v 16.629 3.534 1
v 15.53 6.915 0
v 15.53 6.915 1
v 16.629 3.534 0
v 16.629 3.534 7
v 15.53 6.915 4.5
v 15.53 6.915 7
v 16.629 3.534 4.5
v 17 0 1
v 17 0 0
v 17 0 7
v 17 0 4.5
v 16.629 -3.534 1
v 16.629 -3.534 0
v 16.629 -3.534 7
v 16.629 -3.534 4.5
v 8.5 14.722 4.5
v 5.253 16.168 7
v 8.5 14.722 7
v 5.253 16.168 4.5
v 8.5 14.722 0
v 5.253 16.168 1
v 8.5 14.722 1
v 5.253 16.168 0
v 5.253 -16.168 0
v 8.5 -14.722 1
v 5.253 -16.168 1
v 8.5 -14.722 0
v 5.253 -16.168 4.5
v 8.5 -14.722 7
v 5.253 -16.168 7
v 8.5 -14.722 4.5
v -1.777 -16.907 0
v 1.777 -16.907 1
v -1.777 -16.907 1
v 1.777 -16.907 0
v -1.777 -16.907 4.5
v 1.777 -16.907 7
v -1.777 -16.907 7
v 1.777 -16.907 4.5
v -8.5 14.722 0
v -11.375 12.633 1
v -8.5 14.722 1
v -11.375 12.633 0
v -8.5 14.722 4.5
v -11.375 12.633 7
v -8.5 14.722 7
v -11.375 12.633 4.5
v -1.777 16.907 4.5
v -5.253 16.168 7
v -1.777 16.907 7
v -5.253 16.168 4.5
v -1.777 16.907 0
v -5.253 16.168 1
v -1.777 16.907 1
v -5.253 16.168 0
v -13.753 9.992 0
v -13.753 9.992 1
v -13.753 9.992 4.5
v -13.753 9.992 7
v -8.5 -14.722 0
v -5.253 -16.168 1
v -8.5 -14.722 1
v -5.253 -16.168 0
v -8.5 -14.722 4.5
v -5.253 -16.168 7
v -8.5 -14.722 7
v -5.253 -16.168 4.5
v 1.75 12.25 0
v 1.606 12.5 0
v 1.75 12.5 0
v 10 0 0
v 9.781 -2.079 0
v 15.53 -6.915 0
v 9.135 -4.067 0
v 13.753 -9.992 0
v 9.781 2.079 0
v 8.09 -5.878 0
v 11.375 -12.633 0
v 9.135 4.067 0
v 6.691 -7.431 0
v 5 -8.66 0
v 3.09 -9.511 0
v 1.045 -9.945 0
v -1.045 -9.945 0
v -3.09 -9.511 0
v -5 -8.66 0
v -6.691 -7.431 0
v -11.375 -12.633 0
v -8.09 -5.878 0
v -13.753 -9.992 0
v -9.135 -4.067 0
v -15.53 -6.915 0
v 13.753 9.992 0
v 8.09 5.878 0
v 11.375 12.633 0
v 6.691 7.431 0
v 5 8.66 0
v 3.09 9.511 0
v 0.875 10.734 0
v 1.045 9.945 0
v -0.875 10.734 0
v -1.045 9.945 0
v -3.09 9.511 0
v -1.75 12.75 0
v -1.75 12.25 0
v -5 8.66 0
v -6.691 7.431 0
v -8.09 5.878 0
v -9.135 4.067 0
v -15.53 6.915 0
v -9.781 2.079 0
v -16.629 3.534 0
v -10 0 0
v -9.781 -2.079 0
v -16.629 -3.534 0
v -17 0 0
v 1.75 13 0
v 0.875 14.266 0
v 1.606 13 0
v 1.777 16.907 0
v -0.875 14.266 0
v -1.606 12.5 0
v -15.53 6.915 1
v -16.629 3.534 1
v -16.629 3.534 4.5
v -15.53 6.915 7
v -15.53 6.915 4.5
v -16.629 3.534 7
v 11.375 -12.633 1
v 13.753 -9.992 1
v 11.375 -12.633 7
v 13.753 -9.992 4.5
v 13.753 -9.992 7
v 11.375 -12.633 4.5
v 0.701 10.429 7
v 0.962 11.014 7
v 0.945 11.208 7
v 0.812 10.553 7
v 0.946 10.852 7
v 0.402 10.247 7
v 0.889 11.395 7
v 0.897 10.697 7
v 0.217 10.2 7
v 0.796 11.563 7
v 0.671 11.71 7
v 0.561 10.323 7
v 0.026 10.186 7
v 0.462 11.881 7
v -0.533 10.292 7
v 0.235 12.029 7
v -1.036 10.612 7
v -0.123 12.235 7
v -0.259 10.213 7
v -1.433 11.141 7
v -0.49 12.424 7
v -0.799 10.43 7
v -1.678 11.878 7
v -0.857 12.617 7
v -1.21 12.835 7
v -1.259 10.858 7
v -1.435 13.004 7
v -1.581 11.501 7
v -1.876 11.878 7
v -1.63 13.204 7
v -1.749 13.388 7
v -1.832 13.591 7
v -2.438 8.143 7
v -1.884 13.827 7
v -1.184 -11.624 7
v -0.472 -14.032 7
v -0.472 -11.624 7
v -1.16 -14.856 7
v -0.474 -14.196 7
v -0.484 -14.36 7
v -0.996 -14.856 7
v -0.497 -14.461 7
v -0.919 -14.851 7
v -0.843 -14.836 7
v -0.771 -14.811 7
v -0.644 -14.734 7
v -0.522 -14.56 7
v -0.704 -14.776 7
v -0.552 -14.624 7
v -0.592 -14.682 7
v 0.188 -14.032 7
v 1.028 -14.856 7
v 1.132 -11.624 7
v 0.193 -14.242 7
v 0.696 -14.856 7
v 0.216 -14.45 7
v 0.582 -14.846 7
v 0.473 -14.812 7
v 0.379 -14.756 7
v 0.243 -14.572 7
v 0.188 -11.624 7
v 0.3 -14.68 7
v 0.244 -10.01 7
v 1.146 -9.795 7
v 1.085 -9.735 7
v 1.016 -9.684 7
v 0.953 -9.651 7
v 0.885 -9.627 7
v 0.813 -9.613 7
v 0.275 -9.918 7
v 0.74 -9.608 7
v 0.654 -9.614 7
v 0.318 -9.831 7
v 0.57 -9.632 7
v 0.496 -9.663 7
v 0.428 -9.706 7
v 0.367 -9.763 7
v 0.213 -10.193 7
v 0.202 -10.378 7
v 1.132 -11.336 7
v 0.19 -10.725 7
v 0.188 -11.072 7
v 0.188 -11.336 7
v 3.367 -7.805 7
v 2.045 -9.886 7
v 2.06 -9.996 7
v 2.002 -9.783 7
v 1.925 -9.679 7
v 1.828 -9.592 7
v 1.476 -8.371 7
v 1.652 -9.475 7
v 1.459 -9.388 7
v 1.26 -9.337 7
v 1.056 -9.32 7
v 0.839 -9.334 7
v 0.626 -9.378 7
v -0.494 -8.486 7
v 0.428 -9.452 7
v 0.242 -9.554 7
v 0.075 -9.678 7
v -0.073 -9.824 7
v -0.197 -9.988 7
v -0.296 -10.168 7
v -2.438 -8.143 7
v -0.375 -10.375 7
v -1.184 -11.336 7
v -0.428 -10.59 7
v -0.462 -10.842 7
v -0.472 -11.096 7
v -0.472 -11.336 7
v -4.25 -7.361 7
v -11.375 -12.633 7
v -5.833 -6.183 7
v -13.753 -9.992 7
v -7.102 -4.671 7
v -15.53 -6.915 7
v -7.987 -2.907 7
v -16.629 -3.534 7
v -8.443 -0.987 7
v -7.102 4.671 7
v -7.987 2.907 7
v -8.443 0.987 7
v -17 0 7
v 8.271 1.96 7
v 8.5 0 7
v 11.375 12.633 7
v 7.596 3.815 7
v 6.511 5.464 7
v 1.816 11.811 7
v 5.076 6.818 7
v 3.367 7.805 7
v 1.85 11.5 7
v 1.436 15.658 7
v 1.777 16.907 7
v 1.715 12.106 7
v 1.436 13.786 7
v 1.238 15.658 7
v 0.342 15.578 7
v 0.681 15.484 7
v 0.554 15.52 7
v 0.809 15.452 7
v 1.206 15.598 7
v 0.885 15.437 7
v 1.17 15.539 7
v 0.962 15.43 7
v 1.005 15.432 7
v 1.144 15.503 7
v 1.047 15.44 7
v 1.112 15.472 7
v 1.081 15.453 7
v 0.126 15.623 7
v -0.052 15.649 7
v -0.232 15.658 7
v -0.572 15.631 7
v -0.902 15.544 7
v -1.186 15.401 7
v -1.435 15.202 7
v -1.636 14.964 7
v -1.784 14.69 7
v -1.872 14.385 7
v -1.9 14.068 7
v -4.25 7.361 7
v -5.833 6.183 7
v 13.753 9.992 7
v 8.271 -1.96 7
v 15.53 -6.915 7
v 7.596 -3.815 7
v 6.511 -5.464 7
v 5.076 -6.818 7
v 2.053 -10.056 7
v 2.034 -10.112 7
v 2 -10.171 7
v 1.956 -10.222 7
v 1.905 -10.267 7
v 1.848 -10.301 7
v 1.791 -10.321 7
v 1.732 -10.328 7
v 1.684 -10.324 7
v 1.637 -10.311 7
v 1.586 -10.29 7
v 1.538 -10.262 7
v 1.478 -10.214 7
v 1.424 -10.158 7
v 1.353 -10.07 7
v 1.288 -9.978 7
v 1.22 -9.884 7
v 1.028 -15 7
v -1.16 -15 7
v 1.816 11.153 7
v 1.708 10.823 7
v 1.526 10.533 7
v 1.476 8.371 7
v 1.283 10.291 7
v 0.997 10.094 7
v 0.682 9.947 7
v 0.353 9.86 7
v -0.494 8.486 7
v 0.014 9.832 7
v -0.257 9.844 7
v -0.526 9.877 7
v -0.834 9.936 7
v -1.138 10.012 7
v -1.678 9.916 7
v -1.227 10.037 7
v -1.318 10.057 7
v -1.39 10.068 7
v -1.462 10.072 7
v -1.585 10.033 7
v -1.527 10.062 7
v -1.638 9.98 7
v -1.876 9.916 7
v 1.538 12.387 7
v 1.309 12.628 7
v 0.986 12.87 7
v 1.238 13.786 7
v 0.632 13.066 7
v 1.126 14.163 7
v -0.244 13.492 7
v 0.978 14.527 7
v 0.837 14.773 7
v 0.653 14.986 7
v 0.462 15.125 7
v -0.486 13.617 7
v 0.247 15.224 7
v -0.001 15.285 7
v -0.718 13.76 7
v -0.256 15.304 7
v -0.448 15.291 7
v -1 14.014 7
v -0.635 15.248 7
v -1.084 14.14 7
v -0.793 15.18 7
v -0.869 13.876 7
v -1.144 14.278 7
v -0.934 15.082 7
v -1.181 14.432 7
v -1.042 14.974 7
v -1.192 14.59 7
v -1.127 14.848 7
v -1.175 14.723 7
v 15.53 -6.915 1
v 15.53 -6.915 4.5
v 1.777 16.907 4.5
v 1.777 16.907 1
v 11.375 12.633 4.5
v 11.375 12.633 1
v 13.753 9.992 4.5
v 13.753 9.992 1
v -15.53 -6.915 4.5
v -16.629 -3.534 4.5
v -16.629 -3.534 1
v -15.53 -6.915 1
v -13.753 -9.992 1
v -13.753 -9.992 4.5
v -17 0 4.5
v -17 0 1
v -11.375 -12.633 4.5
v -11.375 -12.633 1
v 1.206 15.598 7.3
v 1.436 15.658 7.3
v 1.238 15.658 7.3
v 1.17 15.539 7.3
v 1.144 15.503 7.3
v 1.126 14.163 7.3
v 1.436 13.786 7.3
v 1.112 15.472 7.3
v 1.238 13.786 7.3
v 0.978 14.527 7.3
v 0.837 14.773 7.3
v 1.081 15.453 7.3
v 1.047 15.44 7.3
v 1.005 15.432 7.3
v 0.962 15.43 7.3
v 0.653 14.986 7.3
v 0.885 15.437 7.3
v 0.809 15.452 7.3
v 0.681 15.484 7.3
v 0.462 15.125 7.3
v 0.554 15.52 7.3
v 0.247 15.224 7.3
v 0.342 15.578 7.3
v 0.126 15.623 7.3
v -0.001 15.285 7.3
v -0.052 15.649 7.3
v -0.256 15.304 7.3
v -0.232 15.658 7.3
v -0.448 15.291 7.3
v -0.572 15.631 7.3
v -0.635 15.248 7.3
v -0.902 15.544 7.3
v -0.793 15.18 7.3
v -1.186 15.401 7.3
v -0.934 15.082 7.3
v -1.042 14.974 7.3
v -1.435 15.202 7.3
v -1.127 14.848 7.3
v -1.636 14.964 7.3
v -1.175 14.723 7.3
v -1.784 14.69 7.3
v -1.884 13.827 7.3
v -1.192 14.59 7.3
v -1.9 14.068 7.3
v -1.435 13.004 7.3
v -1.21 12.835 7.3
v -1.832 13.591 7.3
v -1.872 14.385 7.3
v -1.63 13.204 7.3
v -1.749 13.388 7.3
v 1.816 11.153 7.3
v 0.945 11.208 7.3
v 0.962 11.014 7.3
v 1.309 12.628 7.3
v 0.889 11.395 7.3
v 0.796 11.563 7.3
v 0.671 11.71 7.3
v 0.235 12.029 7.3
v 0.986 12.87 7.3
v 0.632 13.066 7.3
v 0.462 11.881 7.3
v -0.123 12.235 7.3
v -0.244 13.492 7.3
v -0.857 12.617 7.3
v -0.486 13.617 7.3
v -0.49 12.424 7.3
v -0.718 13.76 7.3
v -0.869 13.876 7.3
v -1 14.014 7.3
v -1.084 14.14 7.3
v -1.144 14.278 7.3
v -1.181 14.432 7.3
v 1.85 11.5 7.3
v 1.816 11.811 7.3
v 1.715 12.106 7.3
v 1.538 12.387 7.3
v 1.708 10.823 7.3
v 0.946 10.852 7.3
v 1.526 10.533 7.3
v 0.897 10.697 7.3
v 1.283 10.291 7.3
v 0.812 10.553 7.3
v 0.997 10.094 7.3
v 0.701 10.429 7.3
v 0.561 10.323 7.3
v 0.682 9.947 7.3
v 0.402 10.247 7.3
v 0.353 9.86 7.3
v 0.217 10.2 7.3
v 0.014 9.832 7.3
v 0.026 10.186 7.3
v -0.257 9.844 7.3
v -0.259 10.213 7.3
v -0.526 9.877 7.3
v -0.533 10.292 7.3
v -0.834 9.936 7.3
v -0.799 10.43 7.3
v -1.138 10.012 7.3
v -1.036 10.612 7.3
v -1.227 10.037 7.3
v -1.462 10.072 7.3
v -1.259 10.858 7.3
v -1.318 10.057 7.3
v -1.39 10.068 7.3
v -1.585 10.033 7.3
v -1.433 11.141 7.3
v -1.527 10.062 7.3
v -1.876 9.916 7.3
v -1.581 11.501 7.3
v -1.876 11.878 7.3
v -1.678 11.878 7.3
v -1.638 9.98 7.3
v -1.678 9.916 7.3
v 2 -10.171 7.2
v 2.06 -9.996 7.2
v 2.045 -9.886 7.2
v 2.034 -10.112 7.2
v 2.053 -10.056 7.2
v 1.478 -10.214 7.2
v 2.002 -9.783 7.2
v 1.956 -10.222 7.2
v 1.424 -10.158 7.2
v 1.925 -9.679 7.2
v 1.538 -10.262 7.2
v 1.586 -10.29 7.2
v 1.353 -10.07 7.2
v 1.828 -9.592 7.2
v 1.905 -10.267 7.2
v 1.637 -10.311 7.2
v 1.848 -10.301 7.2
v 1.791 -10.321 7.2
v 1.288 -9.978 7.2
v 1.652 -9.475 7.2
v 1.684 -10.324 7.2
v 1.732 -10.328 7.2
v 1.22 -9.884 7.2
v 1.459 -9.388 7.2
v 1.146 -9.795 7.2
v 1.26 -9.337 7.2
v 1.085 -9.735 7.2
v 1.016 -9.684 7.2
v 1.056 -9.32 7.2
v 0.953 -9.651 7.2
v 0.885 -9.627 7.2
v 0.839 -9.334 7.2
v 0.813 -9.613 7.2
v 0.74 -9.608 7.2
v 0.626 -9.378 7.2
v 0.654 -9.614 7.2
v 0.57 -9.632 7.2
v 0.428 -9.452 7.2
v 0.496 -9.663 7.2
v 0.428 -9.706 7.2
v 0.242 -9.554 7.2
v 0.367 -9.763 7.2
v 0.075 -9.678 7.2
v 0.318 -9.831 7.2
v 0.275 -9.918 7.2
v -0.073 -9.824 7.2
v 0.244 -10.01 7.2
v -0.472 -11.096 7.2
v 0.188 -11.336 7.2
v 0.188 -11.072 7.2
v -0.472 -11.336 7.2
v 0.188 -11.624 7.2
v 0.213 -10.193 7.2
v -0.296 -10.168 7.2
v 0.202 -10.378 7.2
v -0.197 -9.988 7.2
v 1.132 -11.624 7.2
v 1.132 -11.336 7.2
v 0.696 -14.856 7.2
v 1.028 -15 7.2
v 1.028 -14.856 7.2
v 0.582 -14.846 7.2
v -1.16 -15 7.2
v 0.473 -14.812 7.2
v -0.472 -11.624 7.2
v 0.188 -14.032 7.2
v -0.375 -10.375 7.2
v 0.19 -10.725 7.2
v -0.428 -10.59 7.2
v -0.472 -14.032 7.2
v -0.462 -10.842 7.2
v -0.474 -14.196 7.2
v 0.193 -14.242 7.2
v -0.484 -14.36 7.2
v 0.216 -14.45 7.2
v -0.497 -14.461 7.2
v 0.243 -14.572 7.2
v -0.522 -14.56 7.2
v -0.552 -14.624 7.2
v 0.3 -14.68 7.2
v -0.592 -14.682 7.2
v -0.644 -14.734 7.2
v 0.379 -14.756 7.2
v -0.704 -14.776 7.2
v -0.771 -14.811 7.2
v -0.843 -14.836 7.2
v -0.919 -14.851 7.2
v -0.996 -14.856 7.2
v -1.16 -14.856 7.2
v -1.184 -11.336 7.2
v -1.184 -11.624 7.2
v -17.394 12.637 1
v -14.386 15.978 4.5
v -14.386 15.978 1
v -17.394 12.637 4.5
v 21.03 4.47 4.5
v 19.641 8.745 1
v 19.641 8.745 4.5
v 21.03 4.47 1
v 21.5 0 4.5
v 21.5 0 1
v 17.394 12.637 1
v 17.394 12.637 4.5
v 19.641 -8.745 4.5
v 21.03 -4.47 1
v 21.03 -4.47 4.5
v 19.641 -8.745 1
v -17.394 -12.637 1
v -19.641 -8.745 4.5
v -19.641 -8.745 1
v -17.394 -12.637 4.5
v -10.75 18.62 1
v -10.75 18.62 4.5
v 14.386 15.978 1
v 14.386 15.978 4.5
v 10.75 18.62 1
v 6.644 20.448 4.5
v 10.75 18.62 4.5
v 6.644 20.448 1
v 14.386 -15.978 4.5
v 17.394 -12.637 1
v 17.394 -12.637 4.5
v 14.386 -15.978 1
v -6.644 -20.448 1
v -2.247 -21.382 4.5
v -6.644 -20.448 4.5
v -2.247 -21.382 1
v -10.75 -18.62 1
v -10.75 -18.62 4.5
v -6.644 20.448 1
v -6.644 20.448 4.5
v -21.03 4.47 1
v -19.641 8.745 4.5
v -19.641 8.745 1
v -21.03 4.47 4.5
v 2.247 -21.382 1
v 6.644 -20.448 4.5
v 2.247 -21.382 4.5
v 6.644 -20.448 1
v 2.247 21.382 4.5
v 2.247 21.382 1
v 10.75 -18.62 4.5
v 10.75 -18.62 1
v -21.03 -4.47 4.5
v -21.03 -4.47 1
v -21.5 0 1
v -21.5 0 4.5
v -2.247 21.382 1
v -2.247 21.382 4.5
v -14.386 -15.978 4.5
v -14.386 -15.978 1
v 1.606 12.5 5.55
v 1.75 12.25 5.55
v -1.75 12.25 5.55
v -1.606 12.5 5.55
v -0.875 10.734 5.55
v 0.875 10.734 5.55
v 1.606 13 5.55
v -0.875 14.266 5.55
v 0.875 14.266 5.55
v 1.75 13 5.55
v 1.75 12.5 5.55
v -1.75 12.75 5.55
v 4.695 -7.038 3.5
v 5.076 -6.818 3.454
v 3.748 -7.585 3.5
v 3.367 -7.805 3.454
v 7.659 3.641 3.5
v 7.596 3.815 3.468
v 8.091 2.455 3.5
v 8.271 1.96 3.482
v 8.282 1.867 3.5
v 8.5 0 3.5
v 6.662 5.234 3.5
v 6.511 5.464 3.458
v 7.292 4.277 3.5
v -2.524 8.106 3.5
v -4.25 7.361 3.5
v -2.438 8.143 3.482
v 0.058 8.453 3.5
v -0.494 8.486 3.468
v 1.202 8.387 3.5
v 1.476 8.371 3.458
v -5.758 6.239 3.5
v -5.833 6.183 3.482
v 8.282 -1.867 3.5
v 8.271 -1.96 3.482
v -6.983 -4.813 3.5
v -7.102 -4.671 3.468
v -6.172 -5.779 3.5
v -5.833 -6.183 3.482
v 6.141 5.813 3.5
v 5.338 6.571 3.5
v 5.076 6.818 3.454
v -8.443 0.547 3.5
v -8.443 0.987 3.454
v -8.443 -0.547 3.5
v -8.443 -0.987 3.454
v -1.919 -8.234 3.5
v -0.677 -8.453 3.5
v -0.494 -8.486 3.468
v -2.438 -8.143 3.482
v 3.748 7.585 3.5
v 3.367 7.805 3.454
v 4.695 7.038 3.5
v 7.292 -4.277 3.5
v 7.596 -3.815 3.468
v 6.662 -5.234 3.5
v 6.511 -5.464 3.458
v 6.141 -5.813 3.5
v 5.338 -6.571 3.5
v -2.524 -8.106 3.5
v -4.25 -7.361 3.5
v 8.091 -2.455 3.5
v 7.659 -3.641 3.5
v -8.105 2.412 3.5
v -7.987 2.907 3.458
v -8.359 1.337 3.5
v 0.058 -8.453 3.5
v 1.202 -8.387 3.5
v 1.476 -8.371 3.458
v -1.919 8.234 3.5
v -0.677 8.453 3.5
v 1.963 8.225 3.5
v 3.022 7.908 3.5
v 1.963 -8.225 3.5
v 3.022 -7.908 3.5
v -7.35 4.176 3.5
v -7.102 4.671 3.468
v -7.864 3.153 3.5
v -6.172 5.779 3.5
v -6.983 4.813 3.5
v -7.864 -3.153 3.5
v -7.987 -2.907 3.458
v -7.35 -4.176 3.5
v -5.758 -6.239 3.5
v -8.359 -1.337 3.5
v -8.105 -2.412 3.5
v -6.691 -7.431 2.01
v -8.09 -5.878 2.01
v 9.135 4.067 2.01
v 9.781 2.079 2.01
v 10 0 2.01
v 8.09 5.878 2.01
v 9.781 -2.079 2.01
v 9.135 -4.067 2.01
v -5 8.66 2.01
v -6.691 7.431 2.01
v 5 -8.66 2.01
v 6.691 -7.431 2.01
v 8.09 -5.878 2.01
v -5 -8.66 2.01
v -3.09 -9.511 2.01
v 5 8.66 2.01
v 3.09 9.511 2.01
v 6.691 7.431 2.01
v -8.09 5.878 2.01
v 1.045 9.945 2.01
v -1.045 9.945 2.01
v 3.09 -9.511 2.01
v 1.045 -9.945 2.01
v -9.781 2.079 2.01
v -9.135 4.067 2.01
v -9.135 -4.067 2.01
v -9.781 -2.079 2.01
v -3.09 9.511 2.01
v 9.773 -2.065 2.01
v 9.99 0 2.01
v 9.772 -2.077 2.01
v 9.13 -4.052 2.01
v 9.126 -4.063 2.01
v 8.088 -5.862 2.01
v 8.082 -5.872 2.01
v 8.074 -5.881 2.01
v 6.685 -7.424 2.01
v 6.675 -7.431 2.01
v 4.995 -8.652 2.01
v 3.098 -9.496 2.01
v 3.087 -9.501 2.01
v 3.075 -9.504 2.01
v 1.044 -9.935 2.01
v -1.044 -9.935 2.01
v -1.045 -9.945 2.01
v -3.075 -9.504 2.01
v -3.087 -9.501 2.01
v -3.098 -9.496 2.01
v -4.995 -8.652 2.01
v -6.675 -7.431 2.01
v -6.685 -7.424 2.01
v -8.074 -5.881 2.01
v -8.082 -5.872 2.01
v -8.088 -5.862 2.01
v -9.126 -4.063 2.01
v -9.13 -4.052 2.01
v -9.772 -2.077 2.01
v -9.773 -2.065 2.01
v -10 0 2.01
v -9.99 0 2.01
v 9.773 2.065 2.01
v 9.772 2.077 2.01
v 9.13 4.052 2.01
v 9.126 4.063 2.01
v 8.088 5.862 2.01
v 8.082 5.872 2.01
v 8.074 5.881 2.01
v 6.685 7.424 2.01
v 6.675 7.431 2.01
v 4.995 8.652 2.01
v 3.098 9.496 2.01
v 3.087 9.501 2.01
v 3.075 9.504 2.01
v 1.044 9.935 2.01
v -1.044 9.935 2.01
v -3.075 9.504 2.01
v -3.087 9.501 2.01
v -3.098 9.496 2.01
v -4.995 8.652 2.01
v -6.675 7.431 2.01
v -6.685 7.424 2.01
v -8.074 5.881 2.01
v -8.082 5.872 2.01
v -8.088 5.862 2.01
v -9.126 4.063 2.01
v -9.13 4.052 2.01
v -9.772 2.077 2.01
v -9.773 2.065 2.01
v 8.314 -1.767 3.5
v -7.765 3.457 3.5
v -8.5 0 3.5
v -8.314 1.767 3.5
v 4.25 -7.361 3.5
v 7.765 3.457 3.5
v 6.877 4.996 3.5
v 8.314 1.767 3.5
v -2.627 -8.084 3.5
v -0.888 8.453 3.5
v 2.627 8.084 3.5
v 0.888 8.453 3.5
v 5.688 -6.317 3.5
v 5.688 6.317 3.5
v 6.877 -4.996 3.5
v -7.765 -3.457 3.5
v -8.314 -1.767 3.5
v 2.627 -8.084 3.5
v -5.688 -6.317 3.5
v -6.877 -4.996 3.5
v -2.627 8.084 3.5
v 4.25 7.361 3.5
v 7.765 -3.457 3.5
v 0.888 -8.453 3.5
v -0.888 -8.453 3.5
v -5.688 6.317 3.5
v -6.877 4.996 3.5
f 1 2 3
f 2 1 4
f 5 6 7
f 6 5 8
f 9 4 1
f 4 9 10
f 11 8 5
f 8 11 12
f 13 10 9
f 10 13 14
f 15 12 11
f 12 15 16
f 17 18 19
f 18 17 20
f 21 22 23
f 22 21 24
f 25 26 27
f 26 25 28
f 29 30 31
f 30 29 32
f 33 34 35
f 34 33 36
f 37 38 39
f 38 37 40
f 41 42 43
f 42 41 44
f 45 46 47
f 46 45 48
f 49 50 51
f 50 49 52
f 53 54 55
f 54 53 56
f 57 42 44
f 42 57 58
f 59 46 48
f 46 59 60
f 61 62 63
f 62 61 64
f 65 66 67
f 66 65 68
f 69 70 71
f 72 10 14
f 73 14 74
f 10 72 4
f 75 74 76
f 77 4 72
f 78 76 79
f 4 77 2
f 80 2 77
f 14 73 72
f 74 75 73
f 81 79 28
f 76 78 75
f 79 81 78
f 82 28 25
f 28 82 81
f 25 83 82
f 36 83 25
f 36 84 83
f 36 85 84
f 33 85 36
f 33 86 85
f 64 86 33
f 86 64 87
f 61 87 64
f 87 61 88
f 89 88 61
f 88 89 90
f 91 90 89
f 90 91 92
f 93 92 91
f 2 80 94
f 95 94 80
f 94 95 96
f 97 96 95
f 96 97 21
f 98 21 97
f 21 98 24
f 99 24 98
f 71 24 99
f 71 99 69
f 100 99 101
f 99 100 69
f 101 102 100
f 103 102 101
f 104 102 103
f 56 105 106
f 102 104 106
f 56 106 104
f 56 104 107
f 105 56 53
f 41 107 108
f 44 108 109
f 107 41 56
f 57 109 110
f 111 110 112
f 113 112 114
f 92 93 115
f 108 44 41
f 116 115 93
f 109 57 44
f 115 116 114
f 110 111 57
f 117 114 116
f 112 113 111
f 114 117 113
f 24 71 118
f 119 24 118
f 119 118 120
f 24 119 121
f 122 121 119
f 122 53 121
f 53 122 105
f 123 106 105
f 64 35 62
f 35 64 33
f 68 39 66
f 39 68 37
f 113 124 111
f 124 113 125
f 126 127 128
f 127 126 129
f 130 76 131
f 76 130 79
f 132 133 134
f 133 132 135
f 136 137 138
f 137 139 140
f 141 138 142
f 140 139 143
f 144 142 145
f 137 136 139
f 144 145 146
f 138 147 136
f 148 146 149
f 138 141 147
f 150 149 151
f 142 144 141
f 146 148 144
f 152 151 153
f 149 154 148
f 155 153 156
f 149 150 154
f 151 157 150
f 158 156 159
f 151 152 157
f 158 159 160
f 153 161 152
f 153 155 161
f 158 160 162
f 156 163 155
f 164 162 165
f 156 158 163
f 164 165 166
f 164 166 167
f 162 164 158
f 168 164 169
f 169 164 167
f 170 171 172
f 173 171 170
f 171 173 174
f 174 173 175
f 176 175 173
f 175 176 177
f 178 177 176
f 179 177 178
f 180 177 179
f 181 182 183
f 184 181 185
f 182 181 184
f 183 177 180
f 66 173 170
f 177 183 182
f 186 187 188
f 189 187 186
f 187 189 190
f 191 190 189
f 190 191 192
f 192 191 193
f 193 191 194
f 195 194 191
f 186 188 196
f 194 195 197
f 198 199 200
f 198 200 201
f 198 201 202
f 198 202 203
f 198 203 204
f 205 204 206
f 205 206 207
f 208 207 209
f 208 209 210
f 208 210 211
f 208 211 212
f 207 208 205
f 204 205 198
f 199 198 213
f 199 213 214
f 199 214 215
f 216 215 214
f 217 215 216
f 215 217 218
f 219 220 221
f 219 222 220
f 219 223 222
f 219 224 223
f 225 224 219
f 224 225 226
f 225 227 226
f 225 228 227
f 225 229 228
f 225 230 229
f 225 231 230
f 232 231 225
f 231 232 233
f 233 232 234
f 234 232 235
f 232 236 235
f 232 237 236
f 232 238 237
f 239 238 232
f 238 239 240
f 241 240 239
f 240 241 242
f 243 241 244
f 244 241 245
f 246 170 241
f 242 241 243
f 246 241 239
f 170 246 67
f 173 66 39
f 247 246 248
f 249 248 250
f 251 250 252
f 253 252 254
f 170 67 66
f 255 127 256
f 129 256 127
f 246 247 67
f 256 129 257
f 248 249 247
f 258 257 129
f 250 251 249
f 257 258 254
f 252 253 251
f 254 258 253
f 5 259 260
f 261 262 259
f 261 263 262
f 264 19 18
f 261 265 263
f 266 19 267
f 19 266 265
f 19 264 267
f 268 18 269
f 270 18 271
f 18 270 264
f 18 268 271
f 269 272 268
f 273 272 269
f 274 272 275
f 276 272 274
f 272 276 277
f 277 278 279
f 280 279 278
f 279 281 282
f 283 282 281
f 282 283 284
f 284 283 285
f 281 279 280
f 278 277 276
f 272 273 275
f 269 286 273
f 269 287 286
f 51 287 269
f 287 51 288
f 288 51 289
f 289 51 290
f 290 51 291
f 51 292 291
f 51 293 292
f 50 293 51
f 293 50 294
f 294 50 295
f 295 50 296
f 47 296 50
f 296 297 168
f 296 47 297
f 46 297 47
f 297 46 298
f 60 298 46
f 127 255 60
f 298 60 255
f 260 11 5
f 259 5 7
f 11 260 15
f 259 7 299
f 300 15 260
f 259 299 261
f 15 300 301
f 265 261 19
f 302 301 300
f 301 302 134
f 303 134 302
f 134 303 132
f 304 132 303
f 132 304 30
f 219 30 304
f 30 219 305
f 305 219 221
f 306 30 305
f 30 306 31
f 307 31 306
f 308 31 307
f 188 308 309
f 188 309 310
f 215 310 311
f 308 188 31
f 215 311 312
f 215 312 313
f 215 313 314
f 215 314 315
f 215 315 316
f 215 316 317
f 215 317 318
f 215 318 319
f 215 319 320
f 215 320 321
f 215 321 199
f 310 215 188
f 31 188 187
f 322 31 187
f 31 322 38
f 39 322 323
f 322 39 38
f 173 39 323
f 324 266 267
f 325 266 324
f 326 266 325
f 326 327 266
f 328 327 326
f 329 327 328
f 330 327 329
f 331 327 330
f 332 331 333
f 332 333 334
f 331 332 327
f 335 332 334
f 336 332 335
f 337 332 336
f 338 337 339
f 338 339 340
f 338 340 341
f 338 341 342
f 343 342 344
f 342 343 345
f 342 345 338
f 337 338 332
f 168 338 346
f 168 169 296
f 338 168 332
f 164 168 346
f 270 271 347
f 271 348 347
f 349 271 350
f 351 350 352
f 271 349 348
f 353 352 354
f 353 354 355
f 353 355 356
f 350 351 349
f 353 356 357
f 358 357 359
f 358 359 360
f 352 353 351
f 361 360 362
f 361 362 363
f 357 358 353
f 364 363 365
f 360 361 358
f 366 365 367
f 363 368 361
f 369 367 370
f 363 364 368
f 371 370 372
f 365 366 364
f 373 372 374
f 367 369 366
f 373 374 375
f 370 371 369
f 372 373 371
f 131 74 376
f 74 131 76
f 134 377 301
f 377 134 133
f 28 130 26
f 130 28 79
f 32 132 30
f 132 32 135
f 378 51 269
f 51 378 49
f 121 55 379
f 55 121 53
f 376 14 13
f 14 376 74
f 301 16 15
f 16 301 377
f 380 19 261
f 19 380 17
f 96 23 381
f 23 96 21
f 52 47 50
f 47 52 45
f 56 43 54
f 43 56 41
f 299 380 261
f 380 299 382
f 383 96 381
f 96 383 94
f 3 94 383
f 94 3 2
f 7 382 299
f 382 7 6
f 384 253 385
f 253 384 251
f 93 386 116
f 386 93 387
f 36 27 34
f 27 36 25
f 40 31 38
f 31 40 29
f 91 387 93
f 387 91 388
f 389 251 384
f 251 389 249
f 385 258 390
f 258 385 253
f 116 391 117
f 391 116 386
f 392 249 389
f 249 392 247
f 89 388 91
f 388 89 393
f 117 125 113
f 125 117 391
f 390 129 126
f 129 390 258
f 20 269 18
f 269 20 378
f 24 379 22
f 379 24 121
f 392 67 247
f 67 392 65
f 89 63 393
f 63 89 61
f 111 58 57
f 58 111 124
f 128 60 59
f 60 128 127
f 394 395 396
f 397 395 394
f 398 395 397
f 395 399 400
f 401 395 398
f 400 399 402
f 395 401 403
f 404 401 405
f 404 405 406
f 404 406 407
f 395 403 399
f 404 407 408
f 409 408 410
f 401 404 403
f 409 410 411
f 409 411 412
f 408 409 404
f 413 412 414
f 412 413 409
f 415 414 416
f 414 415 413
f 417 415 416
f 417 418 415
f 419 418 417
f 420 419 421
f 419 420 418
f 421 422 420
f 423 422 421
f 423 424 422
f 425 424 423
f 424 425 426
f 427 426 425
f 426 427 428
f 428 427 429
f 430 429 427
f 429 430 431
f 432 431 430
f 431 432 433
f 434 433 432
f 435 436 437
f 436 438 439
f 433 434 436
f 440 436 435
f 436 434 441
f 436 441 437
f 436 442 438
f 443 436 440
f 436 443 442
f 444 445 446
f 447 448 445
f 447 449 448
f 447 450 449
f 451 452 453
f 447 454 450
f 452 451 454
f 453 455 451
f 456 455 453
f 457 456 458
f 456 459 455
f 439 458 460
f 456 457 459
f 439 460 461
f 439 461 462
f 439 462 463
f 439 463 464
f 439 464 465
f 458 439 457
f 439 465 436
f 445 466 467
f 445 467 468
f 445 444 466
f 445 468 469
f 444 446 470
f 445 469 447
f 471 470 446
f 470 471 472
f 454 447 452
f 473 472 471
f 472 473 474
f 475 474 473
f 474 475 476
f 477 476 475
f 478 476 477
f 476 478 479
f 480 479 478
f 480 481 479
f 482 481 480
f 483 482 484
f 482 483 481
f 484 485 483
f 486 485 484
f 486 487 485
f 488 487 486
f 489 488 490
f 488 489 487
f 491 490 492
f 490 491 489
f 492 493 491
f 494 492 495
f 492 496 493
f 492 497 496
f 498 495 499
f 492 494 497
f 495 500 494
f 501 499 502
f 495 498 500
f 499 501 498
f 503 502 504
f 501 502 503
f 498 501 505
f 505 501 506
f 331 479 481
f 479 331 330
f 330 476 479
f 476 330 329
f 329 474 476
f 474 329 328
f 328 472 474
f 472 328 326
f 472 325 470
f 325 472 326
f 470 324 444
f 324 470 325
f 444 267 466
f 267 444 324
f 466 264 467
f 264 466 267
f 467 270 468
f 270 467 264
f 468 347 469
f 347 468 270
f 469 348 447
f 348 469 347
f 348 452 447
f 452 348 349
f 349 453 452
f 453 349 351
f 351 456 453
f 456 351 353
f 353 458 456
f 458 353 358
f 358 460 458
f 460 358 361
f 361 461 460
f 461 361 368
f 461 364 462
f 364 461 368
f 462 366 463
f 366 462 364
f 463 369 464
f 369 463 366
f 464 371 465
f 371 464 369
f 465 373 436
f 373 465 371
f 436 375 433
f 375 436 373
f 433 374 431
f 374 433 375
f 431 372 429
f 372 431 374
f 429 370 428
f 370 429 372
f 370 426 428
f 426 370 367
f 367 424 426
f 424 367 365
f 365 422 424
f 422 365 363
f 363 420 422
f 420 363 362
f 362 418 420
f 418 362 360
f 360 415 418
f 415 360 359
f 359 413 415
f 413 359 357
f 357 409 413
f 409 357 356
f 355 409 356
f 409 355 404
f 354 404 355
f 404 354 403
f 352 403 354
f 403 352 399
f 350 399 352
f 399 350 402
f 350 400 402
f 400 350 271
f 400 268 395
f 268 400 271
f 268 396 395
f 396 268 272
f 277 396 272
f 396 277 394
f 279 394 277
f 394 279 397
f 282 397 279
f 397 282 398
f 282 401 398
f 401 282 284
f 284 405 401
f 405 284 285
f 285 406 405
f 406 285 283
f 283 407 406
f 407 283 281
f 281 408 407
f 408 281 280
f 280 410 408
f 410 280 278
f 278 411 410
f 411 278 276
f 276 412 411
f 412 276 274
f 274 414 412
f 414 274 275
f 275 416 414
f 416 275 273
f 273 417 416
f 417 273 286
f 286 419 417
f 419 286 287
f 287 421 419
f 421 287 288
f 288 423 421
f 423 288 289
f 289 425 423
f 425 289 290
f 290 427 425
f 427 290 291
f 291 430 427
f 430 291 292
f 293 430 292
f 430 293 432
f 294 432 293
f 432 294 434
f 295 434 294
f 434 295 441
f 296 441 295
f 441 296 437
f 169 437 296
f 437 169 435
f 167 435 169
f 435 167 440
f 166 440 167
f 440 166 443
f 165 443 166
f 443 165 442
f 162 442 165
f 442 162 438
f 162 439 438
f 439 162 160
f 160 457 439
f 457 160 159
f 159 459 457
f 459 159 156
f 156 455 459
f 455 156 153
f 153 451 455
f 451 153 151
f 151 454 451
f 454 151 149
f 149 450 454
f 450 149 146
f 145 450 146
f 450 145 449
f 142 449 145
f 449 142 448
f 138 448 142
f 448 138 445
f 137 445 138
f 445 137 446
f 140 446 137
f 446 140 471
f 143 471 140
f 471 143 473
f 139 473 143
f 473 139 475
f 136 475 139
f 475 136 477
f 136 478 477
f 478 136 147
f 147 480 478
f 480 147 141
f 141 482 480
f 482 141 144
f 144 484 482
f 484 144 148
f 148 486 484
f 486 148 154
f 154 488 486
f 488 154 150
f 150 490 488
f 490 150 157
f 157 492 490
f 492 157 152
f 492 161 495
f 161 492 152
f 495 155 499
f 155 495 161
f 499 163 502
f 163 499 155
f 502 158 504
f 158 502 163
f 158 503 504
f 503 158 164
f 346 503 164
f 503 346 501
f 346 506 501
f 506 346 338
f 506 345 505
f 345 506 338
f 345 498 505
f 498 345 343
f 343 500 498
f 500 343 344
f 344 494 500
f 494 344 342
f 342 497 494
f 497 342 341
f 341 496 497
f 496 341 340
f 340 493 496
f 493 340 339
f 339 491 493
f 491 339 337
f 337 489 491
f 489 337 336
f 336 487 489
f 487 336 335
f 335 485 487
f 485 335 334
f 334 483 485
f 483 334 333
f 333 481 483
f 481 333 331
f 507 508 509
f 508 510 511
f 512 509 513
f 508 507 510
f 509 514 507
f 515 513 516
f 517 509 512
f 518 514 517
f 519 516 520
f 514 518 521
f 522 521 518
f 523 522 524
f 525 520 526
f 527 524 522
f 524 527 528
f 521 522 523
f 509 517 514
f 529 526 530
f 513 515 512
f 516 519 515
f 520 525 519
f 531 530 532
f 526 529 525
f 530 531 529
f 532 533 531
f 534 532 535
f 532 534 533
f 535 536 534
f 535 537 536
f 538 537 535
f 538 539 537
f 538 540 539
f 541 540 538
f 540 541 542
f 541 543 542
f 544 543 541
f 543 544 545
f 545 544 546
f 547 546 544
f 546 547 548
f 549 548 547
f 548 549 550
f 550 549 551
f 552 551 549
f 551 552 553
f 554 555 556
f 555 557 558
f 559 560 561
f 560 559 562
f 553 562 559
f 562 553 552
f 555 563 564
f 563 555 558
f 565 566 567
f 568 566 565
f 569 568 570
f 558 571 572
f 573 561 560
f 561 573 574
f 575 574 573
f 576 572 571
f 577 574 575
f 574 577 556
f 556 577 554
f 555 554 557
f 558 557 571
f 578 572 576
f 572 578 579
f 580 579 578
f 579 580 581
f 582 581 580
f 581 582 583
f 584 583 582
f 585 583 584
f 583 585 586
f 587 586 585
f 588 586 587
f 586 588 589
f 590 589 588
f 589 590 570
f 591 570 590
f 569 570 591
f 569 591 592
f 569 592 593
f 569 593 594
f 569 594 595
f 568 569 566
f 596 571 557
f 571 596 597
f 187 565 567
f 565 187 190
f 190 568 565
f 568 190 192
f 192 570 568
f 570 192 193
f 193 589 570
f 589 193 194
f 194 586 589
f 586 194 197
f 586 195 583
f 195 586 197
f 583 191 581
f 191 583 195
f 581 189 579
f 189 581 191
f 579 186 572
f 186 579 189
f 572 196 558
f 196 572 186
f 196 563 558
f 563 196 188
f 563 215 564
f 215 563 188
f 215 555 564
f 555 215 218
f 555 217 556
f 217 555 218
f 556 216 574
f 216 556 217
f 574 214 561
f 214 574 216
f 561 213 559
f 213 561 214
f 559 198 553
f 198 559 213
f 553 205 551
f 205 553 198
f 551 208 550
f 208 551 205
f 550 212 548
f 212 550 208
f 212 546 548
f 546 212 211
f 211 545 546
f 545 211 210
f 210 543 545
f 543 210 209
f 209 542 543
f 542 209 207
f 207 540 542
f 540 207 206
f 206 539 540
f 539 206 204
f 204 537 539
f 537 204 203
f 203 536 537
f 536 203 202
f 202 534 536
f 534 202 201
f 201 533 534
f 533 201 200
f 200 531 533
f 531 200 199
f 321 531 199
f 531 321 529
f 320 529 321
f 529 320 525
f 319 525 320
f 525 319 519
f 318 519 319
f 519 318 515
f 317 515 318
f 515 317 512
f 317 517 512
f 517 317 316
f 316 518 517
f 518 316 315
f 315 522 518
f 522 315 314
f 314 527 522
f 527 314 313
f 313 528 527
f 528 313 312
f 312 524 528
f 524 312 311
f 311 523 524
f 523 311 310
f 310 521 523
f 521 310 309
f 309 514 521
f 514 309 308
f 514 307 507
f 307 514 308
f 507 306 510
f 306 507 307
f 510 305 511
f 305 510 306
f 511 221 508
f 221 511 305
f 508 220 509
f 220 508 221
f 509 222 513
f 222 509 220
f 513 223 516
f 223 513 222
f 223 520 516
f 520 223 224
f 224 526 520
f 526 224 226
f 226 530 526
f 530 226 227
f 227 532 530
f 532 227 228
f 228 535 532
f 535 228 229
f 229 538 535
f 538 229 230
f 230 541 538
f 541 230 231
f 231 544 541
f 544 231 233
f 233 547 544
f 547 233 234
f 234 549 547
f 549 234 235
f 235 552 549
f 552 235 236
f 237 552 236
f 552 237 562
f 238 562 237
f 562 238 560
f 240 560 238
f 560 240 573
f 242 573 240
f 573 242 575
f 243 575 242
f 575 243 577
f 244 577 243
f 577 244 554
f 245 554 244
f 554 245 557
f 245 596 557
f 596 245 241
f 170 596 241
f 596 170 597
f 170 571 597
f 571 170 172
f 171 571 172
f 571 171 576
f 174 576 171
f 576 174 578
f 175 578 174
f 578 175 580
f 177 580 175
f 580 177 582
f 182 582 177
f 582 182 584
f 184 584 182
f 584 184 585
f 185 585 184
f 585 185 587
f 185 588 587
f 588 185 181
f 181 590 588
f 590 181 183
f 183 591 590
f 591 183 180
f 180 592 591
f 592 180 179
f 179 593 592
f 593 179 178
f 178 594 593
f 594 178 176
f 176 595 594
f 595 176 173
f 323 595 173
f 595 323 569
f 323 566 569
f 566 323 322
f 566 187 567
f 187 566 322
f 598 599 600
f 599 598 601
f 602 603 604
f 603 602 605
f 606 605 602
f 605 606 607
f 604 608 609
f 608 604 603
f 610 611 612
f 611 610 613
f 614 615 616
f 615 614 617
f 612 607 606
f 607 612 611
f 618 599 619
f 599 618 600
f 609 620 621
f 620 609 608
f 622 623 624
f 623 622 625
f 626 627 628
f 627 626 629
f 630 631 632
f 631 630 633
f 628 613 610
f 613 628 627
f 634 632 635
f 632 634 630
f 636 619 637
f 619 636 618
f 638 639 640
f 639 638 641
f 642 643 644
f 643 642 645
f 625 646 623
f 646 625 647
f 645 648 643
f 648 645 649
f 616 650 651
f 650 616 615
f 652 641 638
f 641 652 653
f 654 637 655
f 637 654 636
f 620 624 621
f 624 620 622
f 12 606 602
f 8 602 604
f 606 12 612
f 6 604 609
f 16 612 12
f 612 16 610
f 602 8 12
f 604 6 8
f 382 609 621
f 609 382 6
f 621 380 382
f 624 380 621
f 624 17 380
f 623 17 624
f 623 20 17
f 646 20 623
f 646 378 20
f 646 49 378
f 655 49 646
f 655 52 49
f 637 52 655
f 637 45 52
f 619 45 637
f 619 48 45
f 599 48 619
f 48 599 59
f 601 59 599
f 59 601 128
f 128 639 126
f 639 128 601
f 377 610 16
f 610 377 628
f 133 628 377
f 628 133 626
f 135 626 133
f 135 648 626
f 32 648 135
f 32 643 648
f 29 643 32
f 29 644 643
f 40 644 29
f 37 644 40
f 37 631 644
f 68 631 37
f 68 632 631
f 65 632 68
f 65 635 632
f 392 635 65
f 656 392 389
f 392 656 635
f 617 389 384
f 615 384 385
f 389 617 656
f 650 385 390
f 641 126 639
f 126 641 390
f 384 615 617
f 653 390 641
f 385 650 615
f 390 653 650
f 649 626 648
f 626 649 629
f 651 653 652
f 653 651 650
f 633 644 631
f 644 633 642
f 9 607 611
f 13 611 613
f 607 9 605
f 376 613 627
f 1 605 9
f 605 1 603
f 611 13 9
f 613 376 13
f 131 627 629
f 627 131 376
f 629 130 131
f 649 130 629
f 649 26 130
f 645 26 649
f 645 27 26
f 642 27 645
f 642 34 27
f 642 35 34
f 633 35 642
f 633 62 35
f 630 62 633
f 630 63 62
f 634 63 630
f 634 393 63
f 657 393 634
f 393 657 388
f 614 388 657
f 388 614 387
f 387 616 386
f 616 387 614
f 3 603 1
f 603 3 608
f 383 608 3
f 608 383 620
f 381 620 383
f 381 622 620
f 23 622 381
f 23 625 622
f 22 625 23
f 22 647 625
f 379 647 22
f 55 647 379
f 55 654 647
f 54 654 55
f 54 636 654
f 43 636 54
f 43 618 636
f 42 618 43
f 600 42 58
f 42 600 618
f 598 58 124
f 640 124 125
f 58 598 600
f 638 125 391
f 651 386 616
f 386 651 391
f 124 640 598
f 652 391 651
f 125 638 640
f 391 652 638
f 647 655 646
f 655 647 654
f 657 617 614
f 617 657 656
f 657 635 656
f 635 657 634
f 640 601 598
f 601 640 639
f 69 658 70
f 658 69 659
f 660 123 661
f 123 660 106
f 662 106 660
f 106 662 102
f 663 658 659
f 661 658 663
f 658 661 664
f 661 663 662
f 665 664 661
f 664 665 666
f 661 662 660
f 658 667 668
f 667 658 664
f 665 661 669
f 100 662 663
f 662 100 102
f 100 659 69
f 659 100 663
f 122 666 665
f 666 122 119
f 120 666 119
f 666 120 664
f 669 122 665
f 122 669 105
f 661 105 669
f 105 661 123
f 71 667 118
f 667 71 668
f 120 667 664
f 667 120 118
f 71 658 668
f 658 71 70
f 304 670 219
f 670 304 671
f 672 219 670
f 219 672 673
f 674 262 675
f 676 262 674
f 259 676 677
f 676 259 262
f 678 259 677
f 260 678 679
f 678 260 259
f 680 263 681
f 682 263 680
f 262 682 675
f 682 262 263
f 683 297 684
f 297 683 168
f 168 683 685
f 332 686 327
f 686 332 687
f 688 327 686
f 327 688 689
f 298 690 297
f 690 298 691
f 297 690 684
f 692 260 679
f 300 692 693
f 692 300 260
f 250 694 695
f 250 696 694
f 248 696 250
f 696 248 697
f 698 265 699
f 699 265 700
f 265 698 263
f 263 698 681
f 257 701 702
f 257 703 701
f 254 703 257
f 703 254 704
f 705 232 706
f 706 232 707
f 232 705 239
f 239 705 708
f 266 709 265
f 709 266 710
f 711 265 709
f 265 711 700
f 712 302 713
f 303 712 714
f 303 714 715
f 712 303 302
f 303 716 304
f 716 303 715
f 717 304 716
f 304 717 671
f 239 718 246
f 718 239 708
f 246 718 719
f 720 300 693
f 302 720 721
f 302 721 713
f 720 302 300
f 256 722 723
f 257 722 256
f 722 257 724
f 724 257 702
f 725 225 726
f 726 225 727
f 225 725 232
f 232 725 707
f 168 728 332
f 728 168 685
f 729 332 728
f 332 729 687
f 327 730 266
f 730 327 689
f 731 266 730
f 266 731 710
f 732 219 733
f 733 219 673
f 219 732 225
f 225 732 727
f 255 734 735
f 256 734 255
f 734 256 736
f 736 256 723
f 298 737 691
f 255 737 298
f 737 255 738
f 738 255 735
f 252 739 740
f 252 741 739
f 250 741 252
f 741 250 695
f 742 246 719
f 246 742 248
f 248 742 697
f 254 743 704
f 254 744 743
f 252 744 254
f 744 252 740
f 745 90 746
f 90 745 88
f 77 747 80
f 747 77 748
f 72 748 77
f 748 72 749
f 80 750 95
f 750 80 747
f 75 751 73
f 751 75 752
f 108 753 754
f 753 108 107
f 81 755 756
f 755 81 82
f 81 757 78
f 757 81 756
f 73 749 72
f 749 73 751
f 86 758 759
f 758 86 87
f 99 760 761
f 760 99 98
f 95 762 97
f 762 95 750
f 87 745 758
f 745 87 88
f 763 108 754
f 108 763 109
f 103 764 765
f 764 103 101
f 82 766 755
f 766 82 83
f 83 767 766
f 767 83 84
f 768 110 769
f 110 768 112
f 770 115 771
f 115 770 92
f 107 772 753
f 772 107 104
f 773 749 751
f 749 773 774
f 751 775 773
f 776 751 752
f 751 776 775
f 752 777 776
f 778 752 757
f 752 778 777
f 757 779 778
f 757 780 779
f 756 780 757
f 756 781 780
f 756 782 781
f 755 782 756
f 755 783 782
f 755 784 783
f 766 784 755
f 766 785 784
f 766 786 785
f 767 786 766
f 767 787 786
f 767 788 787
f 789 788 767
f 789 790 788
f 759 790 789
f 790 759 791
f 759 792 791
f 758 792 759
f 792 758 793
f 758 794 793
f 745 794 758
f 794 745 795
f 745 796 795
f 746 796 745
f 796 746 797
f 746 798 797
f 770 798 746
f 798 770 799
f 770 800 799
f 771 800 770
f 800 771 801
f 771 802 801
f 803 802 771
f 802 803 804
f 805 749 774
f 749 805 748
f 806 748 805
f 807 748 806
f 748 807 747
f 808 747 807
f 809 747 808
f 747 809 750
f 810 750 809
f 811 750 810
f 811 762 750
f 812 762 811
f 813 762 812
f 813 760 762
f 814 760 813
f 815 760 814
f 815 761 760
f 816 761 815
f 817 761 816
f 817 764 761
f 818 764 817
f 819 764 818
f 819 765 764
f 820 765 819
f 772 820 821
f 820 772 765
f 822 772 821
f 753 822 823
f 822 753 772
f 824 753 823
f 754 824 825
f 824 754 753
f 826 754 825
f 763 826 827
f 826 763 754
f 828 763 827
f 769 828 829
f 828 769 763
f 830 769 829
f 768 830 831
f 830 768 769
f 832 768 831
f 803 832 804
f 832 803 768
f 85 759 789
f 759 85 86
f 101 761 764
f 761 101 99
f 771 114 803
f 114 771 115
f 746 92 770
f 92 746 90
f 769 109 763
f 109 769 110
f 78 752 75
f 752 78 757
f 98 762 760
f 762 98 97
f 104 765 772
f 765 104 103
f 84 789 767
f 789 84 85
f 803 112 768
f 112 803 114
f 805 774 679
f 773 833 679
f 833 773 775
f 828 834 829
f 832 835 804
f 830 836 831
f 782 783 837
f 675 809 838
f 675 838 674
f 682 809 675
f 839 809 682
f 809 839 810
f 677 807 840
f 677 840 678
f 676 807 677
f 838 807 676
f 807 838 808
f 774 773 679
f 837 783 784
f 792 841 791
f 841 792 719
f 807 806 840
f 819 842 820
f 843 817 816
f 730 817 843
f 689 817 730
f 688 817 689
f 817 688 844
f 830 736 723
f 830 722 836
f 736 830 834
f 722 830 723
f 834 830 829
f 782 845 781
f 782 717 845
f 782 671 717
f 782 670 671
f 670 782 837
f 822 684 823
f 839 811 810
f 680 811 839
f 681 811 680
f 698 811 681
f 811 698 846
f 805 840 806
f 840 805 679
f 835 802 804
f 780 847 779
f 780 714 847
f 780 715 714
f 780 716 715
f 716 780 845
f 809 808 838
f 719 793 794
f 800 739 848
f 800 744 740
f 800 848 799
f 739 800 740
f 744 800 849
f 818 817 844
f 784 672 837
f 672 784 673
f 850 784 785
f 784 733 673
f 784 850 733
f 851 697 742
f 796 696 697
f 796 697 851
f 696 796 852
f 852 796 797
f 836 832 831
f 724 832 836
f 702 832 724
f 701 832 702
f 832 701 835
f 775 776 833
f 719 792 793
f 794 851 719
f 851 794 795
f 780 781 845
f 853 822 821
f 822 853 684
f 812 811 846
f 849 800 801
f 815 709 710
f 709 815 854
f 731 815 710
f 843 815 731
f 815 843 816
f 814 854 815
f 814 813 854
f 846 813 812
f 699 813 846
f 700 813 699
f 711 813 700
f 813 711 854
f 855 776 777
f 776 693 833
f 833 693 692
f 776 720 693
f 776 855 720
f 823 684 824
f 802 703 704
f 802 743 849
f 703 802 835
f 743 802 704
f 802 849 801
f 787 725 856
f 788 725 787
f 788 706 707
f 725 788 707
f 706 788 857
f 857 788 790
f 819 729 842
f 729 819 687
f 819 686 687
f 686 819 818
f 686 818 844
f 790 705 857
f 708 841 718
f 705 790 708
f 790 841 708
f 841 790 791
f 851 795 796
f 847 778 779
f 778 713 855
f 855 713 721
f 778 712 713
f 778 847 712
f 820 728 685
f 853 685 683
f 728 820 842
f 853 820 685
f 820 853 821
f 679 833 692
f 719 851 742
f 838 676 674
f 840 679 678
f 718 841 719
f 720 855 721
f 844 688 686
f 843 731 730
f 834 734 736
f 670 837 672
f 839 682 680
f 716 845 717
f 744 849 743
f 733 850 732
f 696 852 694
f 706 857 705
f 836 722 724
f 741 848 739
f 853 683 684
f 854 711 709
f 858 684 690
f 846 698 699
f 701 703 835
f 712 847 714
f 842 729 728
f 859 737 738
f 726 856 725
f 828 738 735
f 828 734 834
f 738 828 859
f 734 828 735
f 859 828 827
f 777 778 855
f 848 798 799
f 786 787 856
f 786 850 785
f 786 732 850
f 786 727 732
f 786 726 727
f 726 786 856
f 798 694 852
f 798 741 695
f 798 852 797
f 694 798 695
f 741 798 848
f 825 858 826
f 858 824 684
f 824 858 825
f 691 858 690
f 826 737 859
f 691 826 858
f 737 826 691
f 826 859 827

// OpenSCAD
module letter(l,font="font.dxf",h=100,i=0) {
	union() {
		linear_extrude( height=h) import(font, layer=l[i]);
		translate([dxf_dim(file=font, name="advx",layer=l[i]),
			dxf_dim(file=font, name="advy",layer=l[i]),
			0])
			child();
	}
}

module word(wrd,font="font.dxf",h=100,i=0) {
	if(i < len(wrd)) {
		letter(wrd,font,h,i) word(wrd,font,h,i+1);
	} else {
		child();
	}
}

difference() {
	union() {
		// Big cylinder for placement inside the machine.
		cylinder(h = 7, r = 17);

		// The initials of the Starship Factory to be
		// displayed on top.
		translate([-2.5, 10, 7]) scale(0.003) letter("s");
		translate([-1.5, -15, 7]) scale(0.002) letter("f");

		// Outer cylinder; any sewing information would go here.
		translate([0, 0, 1]) cylinder(h = 3.5, r = 21.5);
	}

	// Subtract the inner hole. Be very generous.
	translate([0, 0, 4])
		cylinder(h = 10, r = 8.5, center=true);

	// Subtract the lower cone.
	cylinder(h = 2.01, r = 10);

	// Subtract the diagonal layer the disk rests on.
	translate([0, 0, 2])
		cylinder(h = 1.5, r1 = 10, r2 = 8.5);

	// Transport hole
	union() {
		translate([0, 12.25, -0.05])
			cylinder(h = 5.6, r=1.75);
		translate([0, 12.75, -0.05])
			cylinder(h = 5.6, r=1.75);
		translate([0, 12.5, -0.05])
			cube(size = [1.75, 0.5, 5.6]);
	}
}
